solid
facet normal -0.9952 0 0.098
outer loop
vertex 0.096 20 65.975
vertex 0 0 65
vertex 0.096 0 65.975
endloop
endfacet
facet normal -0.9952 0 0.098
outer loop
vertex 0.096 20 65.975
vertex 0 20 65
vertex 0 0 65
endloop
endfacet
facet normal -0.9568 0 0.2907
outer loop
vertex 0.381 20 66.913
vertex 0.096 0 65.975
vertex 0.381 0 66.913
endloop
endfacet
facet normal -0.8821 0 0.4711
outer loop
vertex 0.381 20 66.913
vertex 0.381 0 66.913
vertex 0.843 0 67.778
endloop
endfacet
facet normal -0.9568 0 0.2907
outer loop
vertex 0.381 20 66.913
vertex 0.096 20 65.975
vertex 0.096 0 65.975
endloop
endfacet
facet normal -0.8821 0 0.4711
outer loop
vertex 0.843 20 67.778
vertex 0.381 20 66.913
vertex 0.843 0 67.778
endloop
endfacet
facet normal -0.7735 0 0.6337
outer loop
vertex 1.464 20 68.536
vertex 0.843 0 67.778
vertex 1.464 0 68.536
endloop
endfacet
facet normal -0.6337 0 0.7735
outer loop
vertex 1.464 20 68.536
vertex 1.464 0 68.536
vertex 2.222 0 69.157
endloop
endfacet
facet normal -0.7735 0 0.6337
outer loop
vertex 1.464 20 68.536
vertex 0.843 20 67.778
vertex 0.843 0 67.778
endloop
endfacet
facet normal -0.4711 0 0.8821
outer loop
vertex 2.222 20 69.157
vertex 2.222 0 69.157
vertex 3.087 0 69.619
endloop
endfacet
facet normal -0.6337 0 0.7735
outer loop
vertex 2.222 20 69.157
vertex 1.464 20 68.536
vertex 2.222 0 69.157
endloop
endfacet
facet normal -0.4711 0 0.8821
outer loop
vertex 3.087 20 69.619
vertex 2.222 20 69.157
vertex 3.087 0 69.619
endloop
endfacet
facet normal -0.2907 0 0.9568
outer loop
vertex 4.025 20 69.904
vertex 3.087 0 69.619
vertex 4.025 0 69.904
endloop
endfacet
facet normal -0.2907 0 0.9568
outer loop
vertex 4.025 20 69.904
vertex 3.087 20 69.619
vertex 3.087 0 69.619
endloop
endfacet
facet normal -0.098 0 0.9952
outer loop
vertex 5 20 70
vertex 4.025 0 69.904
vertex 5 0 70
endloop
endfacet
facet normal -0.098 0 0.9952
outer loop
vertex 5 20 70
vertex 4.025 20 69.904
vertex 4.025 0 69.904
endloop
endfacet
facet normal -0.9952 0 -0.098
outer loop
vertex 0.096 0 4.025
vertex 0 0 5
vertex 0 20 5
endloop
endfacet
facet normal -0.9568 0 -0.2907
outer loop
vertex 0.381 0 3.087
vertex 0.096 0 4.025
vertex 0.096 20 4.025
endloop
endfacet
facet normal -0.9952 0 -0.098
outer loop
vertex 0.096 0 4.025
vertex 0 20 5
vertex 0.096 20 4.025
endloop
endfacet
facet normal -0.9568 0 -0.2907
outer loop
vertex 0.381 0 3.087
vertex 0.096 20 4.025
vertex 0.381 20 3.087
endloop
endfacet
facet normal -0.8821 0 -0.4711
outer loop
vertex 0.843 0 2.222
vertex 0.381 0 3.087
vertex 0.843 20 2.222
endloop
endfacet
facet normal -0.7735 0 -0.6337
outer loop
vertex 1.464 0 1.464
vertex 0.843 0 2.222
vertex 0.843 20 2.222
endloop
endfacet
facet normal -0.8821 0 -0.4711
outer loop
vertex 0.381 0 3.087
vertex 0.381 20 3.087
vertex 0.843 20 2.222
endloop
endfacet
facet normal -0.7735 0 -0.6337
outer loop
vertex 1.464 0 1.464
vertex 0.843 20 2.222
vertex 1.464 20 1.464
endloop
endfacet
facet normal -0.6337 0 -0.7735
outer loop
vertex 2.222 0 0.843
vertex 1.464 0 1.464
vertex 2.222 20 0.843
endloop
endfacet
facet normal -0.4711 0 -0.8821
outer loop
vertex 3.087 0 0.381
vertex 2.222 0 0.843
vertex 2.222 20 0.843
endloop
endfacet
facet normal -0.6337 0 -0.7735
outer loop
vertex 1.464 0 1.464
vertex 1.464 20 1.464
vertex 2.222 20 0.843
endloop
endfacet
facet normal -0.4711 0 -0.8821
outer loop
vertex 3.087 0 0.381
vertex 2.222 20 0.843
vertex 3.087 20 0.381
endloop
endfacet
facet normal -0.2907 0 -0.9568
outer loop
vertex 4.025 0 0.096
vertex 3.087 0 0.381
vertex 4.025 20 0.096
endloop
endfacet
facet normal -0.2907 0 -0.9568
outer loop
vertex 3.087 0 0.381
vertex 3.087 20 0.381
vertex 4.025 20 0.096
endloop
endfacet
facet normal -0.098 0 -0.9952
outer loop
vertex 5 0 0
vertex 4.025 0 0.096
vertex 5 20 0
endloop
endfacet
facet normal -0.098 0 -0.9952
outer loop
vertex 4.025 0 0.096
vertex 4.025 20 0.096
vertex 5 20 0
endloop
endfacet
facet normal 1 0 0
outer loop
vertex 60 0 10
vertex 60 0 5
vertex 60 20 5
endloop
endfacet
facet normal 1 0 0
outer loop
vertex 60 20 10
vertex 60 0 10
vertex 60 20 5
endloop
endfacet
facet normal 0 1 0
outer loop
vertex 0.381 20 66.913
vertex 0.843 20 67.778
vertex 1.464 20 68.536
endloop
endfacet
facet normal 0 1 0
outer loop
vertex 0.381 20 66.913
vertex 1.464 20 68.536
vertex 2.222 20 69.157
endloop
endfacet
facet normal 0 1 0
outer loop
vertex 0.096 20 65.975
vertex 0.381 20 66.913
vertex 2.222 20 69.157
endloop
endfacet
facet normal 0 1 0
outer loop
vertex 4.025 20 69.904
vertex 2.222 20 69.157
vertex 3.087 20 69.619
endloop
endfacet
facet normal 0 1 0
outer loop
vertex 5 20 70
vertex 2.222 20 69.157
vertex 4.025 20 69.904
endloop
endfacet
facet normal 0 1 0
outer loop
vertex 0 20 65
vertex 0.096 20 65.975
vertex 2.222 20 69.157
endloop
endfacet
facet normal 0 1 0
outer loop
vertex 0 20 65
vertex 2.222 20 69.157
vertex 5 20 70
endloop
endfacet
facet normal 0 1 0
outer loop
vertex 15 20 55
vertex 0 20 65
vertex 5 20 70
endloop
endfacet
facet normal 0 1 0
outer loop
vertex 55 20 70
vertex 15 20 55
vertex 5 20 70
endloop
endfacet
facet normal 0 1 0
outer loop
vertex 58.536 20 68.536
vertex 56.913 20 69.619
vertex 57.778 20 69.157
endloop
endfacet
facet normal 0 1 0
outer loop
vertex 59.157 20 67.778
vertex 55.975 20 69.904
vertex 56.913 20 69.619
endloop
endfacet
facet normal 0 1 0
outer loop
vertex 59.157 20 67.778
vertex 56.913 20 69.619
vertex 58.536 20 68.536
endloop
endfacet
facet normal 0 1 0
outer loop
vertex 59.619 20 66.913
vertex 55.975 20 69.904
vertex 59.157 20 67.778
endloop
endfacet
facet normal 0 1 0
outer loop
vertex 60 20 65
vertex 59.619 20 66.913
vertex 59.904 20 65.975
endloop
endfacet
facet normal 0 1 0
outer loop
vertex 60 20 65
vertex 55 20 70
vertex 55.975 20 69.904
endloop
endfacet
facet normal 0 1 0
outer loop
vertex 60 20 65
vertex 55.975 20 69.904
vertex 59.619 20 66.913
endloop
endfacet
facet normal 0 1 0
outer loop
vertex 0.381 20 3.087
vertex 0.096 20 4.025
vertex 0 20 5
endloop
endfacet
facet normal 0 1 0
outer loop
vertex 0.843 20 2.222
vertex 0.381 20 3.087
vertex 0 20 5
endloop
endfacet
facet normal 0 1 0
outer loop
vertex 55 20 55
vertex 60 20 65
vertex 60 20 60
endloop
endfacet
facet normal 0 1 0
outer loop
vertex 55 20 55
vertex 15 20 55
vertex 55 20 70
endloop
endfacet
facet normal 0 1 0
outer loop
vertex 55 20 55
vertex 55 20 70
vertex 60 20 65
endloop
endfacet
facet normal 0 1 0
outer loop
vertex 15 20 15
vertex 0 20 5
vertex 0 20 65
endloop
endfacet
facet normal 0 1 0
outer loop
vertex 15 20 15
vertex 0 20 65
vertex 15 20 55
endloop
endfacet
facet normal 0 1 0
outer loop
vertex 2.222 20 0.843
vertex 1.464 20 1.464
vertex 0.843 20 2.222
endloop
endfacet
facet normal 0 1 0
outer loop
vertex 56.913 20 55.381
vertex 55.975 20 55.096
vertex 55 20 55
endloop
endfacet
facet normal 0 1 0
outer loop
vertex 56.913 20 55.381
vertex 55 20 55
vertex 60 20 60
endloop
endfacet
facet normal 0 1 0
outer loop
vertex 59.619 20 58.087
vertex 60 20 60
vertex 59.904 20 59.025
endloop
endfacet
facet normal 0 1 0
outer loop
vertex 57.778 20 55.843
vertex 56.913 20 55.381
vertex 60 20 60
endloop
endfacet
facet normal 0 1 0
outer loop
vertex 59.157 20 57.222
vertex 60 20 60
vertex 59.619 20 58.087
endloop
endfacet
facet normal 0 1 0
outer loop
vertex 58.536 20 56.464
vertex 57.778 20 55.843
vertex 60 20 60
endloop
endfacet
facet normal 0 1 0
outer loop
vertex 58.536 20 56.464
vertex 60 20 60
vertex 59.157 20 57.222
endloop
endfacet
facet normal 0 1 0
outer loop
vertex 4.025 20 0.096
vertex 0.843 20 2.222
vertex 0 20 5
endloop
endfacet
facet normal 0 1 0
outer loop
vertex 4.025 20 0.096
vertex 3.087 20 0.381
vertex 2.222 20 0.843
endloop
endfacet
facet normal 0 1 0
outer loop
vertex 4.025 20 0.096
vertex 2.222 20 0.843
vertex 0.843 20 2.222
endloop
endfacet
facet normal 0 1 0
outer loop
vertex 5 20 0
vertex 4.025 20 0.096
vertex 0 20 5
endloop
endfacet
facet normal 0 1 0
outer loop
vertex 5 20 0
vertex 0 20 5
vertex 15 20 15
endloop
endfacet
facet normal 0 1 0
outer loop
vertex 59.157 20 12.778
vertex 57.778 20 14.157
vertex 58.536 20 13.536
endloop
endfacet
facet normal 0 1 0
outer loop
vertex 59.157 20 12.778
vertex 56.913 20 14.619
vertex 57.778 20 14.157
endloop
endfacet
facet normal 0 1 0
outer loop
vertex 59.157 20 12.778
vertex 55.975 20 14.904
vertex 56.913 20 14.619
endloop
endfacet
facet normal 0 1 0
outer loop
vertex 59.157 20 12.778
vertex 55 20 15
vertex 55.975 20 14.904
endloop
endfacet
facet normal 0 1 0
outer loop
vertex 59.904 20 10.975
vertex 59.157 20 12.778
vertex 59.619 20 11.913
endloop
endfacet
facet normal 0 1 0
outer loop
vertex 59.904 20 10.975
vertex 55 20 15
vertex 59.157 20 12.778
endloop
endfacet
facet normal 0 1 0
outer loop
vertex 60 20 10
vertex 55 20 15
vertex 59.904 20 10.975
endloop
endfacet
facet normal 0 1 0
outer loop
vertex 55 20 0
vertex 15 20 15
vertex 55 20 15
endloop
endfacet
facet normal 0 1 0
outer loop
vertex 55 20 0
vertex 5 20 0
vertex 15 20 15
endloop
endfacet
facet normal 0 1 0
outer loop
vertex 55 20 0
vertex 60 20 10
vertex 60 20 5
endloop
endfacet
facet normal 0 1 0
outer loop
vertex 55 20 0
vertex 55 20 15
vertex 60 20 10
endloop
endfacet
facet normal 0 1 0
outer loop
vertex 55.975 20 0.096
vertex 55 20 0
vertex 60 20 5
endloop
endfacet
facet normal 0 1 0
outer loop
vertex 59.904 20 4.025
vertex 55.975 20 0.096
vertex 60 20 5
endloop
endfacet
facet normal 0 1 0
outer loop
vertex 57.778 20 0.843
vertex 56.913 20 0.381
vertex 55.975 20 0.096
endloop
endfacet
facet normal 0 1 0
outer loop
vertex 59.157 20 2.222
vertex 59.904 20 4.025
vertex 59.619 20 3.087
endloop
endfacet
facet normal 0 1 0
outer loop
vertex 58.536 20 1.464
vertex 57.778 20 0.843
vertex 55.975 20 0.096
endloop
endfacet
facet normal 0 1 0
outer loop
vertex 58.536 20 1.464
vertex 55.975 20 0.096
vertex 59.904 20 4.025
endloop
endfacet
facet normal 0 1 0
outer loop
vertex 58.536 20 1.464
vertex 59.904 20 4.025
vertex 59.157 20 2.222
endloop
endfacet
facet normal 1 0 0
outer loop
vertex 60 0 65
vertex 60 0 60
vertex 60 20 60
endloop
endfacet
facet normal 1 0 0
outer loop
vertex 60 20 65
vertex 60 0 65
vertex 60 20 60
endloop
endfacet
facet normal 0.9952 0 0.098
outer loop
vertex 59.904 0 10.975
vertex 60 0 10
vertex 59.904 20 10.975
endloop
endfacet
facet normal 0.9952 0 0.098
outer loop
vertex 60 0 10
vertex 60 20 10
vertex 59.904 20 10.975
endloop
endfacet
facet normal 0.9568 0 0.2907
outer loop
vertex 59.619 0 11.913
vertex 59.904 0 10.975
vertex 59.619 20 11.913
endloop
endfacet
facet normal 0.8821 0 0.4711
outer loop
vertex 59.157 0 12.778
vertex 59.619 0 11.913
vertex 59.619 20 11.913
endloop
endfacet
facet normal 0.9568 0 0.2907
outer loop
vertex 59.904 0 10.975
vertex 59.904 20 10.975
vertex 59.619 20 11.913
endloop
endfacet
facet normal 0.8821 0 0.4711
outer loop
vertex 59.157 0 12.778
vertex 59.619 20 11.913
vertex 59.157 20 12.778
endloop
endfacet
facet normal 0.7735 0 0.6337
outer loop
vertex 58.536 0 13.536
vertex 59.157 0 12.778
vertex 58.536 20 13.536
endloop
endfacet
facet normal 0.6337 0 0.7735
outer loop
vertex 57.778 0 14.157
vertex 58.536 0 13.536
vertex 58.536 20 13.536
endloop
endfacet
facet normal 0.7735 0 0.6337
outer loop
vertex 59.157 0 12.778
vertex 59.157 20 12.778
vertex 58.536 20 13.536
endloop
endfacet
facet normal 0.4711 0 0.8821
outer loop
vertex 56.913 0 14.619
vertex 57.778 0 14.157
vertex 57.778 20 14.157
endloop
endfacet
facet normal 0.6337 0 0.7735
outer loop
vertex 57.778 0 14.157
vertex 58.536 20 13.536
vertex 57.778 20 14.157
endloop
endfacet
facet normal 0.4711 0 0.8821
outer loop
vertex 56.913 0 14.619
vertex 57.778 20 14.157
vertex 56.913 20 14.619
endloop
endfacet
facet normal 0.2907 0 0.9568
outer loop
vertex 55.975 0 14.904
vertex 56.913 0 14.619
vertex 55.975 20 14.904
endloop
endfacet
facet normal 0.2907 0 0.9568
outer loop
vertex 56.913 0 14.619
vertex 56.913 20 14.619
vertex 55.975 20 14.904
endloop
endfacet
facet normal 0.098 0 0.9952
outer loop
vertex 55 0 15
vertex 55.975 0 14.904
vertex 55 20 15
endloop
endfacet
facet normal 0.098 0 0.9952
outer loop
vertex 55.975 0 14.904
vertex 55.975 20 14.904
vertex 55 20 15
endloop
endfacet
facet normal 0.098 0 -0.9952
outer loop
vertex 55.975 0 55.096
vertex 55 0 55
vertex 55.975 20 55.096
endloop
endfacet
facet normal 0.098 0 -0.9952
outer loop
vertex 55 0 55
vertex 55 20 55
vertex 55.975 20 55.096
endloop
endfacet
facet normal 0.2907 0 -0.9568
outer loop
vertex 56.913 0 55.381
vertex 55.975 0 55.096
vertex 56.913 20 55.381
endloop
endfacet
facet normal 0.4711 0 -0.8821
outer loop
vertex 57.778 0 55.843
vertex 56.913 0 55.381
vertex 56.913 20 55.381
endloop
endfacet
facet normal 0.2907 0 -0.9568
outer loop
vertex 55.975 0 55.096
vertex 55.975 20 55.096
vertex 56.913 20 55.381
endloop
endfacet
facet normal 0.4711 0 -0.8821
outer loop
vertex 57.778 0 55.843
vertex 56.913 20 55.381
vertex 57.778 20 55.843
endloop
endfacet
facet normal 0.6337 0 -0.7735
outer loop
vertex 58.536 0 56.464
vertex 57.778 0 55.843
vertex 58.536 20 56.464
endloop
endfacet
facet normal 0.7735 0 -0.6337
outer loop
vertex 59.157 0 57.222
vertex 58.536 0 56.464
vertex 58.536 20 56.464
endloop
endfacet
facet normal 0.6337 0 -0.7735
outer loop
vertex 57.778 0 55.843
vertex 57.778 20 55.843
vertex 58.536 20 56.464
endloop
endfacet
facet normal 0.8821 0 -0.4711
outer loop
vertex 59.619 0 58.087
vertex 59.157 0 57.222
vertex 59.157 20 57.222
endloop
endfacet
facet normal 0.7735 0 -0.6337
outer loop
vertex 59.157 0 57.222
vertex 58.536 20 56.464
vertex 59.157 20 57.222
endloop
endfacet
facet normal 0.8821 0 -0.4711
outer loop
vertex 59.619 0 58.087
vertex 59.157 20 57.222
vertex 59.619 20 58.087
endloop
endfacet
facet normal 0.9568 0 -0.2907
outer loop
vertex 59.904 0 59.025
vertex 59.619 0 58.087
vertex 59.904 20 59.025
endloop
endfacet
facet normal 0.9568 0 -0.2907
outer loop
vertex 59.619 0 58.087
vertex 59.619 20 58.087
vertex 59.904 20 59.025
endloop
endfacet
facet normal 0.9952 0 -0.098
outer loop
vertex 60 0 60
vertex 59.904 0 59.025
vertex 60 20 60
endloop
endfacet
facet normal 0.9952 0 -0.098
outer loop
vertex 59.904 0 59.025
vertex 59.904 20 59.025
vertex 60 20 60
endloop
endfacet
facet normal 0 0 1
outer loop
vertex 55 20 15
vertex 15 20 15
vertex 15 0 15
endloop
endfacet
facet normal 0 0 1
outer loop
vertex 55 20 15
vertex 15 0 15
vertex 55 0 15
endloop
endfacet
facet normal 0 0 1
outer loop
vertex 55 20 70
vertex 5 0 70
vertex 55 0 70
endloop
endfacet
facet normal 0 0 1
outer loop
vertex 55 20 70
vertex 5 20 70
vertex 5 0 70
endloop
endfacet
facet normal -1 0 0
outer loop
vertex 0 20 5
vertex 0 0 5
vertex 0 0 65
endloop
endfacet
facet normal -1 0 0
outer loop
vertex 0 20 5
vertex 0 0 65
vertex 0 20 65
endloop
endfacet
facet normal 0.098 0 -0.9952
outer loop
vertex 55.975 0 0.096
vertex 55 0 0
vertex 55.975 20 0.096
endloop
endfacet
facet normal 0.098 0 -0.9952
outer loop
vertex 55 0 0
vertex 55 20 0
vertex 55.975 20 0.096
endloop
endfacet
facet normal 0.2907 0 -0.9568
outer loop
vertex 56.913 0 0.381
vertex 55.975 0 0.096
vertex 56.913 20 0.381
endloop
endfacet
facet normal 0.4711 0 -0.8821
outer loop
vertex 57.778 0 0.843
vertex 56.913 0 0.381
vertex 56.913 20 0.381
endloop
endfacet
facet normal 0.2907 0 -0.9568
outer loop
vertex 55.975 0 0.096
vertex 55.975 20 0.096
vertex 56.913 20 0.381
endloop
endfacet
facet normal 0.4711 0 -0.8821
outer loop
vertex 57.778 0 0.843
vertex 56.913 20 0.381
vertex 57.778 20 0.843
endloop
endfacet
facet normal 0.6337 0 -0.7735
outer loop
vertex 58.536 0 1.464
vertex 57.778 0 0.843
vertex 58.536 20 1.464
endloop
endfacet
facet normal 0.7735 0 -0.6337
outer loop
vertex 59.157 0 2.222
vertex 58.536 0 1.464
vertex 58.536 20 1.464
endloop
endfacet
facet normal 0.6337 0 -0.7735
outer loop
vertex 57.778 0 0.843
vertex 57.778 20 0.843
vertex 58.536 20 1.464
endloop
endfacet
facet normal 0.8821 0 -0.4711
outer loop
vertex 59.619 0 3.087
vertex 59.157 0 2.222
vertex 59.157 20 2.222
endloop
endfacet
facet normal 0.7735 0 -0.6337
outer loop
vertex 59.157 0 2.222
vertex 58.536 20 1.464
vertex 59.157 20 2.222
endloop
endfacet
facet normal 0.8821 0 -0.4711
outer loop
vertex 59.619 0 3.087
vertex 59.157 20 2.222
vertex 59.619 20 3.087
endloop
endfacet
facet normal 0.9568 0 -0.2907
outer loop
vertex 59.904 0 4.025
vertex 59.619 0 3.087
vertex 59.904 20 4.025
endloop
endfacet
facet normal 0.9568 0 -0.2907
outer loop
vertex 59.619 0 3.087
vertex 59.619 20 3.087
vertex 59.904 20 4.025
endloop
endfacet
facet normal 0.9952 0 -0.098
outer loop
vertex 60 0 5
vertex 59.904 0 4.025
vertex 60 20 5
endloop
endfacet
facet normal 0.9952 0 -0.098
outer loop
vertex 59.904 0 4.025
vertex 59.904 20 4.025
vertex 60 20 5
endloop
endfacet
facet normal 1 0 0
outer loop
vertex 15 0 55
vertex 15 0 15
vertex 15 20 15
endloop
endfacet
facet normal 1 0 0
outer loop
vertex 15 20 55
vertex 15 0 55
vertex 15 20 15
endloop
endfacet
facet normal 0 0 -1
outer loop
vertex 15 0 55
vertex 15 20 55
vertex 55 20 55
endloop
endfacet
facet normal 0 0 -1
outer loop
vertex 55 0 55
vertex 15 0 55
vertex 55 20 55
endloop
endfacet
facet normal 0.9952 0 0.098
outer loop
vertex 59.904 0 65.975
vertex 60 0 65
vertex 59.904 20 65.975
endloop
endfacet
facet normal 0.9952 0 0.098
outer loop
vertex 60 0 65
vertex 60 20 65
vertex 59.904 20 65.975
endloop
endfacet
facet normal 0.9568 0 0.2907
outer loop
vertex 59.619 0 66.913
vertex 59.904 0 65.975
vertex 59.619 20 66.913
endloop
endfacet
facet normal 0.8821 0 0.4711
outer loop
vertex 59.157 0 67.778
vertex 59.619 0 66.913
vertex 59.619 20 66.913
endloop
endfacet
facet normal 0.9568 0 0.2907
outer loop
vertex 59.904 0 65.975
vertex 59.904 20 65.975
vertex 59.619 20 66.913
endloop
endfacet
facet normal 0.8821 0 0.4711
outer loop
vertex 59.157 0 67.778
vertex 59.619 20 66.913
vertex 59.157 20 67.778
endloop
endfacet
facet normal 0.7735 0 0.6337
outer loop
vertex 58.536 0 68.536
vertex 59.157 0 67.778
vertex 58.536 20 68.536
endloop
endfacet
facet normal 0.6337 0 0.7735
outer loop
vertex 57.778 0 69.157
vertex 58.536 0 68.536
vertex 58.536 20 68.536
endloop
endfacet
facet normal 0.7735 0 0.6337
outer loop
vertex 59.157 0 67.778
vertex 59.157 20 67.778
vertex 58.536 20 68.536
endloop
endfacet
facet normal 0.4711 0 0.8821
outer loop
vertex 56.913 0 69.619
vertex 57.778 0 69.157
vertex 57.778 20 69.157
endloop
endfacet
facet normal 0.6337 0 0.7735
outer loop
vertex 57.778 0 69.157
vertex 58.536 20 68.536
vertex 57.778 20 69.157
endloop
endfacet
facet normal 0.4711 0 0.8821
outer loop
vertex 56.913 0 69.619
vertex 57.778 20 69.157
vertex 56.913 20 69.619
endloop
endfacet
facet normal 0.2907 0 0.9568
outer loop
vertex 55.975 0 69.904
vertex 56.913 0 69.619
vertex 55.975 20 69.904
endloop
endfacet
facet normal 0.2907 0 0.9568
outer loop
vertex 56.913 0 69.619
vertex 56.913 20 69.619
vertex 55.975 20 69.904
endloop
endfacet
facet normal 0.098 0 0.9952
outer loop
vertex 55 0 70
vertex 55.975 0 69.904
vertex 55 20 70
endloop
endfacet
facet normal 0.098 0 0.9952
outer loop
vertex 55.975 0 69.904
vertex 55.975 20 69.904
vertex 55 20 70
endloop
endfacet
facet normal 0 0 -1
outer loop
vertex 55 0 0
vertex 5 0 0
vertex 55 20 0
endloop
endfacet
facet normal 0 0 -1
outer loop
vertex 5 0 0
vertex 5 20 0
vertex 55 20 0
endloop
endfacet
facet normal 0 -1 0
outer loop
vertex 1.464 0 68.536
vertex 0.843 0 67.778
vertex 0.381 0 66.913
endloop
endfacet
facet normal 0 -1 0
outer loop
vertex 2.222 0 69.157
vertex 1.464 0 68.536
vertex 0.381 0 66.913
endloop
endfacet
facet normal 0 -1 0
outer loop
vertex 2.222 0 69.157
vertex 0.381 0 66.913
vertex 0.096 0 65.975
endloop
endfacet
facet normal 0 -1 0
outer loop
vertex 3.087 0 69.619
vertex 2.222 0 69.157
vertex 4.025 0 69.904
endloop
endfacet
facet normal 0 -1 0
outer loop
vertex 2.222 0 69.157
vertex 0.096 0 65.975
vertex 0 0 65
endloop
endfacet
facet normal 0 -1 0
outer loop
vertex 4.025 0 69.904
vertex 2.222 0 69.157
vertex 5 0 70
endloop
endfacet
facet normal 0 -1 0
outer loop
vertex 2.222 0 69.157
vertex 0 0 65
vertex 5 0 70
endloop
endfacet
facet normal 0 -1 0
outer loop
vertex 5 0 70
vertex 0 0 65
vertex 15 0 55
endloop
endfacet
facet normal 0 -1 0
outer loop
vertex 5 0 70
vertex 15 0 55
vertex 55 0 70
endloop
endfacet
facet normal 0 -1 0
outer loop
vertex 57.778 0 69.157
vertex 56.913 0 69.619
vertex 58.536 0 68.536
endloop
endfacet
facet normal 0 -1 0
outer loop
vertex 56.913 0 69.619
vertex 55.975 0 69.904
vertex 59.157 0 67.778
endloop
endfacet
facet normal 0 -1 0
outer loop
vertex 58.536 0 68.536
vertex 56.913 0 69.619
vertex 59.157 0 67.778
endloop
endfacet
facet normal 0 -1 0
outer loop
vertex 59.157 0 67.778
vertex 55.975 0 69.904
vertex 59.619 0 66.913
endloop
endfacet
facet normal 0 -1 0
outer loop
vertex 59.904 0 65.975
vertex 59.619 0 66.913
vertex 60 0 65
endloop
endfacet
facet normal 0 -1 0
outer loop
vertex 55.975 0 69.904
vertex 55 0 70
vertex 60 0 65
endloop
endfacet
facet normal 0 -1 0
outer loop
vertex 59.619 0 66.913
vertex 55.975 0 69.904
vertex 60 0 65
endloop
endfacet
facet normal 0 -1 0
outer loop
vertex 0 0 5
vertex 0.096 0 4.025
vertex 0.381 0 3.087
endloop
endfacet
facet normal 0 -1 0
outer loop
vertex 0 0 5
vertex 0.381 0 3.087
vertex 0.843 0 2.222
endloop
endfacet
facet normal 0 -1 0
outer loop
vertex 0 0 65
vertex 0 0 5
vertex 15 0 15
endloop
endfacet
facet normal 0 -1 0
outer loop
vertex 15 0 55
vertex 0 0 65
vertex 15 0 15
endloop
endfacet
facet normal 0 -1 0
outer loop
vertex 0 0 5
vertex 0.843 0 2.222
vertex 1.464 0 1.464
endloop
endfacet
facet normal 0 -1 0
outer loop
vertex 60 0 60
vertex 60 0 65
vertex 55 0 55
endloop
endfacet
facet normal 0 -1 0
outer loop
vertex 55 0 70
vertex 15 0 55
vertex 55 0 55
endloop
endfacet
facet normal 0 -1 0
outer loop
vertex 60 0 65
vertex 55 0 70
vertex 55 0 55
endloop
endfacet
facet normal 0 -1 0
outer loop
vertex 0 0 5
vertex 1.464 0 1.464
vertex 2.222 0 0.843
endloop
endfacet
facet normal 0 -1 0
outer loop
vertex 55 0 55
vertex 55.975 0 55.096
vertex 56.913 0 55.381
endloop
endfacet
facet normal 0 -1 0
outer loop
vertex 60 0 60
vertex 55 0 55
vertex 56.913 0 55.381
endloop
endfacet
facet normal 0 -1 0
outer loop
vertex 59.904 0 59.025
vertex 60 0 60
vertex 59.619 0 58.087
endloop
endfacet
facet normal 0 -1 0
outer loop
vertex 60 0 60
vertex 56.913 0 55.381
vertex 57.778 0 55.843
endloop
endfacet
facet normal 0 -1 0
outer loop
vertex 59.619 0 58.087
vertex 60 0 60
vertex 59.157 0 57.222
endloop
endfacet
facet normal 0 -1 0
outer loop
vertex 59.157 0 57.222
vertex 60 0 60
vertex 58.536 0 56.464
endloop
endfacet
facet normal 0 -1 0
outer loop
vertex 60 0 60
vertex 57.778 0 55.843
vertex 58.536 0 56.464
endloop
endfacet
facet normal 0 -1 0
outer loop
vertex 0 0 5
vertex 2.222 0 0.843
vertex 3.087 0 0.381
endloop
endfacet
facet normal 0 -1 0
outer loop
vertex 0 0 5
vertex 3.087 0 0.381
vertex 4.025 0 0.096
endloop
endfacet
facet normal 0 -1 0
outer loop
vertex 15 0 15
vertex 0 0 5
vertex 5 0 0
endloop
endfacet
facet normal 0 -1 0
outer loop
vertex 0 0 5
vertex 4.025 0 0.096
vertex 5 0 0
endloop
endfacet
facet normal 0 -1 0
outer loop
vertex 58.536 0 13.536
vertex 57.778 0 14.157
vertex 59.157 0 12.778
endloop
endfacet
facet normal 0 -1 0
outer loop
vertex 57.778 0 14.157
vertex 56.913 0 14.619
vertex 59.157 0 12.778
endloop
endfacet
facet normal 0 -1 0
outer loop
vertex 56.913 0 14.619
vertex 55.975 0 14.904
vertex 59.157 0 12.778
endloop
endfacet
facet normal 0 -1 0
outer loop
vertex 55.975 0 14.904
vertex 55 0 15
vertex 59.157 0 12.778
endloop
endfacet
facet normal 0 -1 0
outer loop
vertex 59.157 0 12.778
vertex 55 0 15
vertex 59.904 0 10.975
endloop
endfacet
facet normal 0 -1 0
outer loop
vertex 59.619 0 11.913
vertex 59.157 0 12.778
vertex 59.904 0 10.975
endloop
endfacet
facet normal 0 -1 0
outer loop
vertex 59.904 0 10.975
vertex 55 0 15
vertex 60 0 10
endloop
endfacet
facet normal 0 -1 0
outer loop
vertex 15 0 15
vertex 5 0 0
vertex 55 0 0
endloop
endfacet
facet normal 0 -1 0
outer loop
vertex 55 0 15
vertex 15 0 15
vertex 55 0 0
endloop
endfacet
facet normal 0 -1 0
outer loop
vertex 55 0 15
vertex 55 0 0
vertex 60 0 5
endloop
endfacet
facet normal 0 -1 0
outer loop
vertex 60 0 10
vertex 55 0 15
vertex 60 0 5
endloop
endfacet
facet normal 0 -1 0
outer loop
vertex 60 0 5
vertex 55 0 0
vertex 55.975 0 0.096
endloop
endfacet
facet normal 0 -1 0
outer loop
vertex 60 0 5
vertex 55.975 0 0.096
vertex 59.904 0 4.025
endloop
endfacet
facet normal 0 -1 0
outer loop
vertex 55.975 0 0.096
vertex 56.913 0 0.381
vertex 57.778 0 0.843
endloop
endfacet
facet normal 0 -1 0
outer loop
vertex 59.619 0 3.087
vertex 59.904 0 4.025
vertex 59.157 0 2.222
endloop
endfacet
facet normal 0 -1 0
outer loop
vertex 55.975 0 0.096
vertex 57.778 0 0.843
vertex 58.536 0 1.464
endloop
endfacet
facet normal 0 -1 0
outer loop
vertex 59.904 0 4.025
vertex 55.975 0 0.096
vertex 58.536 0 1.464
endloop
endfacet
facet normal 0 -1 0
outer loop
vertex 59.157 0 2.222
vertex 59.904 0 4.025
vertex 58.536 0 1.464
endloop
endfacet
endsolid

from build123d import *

# Parameters (mm, degrees)
BOX_W        = 60
BOX_H        = 20
BOX_DEPTH    = 15
BOX001_W     = 15
BOX001_H     = 20
BOX001_DEPTH = 70
BOX002_W     = 60
BOX002_H     = 20
BOX002_DEPTH = 15
FILLET_R     = 5


with BuildPart() as cube:
    # Box → Box (new body)
    with BuildSketch(Plane.XY):
        with Locations((30, 10)):
            Rectangle(BOX_W, BOX_H)
    extrude(amount=BOX_DEPTH)


with BuildPart() as cube001:
    # Box001 → Box001 (new body)
    with BuildSketch(Plane.XY):
        with Locations((7.5, 10)):
            Rectangle(BOX001_W, BOX001_H)
    extrude(amount=BOX001_DEPTH)


with BuildPart() as fillet_body:
    # Box002 → Box002 (new body)
    with BuildSketch(Plane.XY.offset(55)):
        with Locations((30, 10)):
            Rectangle(BOX002_W, BOX002_H)
    extrude(amount=BOX002_DEPTH)

    # Fusion: union Cube, Cube001
    add(cube.part)
    add(cube001.part)

    # Fillet
    fillet_edges = [fillet_body.edges().sort_by_distance(p)[0] for p in [
        (0, 10, 70),
        (60, 10, 70),
        (0, 10, 0),
        (60, 10, 55),
        (60, 10, 15),
        (60, 10, 0),
    ]]
    fillet(fillet_edges, radius=FILLET_R)


solid = fillet_body.part
